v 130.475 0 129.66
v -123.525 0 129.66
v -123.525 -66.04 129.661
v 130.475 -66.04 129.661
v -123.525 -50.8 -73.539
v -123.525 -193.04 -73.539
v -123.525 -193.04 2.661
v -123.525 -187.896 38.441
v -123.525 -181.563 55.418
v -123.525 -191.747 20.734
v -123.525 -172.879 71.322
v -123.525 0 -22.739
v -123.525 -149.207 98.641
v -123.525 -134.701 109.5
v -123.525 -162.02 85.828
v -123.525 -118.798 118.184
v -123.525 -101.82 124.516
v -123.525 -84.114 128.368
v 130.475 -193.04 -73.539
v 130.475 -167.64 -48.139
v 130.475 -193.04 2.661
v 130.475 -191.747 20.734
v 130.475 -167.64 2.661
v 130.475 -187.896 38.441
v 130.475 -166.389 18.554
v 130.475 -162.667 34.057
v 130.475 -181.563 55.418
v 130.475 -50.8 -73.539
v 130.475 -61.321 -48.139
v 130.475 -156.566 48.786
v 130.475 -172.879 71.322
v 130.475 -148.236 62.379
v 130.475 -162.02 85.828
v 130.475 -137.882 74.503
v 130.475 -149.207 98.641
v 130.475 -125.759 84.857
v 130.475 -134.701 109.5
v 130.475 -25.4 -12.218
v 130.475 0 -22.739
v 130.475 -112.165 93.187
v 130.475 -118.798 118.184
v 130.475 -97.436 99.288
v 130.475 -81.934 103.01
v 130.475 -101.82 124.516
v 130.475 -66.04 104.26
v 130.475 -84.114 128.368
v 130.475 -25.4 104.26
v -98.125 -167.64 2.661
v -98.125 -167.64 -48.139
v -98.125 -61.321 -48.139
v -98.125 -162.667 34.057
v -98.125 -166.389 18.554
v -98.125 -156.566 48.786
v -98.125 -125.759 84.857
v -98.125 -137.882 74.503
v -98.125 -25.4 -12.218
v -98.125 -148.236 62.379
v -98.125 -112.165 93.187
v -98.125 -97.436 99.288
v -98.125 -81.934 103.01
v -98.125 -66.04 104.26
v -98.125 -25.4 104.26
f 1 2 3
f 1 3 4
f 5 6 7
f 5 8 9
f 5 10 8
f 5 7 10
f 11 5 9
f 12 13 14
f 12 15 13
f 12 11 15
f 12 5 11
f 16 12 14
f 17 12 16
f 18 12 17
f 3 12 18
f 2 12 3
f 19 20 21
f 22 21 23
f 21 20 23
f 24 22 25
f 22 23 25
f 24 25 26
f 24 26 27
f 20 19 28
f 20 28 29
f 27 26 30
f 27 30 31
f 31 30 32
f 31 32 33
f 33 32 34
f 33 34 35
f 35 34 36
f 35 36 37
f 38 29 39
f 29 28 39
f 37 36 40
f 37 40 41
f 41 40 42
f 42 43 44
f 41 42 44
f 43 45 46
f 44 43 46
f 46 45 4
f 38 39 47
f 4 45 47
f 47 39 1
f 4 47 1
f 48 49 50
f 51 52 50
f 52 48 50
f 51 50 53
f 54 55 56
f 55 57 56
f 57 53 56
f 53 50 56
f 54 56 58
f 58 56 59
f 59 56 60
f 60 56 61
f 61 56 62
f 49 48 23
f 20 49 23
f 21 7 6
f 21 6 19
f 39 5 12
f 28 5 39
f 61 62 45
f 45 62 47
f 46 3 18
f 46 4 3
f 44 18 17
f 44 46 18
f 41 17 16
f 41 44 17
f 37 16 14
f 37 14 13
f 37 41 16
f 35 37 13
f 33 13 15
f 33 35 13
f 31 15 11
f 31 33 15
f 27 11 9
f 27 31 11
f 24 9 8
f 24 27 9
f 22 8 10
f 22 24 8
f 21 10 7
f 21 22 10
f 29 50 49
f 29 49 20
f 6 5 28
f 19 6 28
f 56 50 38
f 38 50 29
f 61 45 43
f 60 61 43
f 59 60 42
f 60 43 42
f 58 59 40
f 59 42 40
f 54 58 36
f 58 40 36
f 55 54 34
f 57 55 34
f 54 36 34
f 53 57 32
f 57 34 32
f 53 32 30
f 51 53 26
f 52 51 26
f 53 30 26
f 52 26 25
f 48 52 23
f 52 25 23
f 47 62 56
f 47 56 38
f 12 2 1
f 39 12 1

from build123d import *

# Parameters (mm, degrees)
F0_W     = 254
F0_H     = 203.2
F1_DEPTH = 193.04
F2_R     = 127
F3_SIZE  = 50.8
F4_T     = -25.4


with BuildPart() as f1:
    # F0 (on Front) → F1 (new body)
    with BuildSketch(Plane.XZ):
        with Locations((3.474914, 28.0605)):
            Rectangle(F0_W, F0_H)
    extrude(amount=F1_DEPTH)

    # F2
    f2_edges = [f1.edges().sort_by_distance(p)[0] for p in [
        (3.474914, -193.04, 129.6605),
    ]]
    fillet(f2_edges, radius=F2_R)

    # F3
    f3_edges = [f1.edges().sort_by_distance(p)[0] for p in [
        (3.474914, 0, -73.5395),
    ]]
    chamfer(f3_edges, length=F3_SIZE)

    # F4
    f4_openings = [f1.faces().sort_by_distance(p)[0] for p in [
        (130.474914, -92.656111, 23.8767),
    ]]
    offset(amount=F4_T, openings=f4_openings)


solid = f1.part
